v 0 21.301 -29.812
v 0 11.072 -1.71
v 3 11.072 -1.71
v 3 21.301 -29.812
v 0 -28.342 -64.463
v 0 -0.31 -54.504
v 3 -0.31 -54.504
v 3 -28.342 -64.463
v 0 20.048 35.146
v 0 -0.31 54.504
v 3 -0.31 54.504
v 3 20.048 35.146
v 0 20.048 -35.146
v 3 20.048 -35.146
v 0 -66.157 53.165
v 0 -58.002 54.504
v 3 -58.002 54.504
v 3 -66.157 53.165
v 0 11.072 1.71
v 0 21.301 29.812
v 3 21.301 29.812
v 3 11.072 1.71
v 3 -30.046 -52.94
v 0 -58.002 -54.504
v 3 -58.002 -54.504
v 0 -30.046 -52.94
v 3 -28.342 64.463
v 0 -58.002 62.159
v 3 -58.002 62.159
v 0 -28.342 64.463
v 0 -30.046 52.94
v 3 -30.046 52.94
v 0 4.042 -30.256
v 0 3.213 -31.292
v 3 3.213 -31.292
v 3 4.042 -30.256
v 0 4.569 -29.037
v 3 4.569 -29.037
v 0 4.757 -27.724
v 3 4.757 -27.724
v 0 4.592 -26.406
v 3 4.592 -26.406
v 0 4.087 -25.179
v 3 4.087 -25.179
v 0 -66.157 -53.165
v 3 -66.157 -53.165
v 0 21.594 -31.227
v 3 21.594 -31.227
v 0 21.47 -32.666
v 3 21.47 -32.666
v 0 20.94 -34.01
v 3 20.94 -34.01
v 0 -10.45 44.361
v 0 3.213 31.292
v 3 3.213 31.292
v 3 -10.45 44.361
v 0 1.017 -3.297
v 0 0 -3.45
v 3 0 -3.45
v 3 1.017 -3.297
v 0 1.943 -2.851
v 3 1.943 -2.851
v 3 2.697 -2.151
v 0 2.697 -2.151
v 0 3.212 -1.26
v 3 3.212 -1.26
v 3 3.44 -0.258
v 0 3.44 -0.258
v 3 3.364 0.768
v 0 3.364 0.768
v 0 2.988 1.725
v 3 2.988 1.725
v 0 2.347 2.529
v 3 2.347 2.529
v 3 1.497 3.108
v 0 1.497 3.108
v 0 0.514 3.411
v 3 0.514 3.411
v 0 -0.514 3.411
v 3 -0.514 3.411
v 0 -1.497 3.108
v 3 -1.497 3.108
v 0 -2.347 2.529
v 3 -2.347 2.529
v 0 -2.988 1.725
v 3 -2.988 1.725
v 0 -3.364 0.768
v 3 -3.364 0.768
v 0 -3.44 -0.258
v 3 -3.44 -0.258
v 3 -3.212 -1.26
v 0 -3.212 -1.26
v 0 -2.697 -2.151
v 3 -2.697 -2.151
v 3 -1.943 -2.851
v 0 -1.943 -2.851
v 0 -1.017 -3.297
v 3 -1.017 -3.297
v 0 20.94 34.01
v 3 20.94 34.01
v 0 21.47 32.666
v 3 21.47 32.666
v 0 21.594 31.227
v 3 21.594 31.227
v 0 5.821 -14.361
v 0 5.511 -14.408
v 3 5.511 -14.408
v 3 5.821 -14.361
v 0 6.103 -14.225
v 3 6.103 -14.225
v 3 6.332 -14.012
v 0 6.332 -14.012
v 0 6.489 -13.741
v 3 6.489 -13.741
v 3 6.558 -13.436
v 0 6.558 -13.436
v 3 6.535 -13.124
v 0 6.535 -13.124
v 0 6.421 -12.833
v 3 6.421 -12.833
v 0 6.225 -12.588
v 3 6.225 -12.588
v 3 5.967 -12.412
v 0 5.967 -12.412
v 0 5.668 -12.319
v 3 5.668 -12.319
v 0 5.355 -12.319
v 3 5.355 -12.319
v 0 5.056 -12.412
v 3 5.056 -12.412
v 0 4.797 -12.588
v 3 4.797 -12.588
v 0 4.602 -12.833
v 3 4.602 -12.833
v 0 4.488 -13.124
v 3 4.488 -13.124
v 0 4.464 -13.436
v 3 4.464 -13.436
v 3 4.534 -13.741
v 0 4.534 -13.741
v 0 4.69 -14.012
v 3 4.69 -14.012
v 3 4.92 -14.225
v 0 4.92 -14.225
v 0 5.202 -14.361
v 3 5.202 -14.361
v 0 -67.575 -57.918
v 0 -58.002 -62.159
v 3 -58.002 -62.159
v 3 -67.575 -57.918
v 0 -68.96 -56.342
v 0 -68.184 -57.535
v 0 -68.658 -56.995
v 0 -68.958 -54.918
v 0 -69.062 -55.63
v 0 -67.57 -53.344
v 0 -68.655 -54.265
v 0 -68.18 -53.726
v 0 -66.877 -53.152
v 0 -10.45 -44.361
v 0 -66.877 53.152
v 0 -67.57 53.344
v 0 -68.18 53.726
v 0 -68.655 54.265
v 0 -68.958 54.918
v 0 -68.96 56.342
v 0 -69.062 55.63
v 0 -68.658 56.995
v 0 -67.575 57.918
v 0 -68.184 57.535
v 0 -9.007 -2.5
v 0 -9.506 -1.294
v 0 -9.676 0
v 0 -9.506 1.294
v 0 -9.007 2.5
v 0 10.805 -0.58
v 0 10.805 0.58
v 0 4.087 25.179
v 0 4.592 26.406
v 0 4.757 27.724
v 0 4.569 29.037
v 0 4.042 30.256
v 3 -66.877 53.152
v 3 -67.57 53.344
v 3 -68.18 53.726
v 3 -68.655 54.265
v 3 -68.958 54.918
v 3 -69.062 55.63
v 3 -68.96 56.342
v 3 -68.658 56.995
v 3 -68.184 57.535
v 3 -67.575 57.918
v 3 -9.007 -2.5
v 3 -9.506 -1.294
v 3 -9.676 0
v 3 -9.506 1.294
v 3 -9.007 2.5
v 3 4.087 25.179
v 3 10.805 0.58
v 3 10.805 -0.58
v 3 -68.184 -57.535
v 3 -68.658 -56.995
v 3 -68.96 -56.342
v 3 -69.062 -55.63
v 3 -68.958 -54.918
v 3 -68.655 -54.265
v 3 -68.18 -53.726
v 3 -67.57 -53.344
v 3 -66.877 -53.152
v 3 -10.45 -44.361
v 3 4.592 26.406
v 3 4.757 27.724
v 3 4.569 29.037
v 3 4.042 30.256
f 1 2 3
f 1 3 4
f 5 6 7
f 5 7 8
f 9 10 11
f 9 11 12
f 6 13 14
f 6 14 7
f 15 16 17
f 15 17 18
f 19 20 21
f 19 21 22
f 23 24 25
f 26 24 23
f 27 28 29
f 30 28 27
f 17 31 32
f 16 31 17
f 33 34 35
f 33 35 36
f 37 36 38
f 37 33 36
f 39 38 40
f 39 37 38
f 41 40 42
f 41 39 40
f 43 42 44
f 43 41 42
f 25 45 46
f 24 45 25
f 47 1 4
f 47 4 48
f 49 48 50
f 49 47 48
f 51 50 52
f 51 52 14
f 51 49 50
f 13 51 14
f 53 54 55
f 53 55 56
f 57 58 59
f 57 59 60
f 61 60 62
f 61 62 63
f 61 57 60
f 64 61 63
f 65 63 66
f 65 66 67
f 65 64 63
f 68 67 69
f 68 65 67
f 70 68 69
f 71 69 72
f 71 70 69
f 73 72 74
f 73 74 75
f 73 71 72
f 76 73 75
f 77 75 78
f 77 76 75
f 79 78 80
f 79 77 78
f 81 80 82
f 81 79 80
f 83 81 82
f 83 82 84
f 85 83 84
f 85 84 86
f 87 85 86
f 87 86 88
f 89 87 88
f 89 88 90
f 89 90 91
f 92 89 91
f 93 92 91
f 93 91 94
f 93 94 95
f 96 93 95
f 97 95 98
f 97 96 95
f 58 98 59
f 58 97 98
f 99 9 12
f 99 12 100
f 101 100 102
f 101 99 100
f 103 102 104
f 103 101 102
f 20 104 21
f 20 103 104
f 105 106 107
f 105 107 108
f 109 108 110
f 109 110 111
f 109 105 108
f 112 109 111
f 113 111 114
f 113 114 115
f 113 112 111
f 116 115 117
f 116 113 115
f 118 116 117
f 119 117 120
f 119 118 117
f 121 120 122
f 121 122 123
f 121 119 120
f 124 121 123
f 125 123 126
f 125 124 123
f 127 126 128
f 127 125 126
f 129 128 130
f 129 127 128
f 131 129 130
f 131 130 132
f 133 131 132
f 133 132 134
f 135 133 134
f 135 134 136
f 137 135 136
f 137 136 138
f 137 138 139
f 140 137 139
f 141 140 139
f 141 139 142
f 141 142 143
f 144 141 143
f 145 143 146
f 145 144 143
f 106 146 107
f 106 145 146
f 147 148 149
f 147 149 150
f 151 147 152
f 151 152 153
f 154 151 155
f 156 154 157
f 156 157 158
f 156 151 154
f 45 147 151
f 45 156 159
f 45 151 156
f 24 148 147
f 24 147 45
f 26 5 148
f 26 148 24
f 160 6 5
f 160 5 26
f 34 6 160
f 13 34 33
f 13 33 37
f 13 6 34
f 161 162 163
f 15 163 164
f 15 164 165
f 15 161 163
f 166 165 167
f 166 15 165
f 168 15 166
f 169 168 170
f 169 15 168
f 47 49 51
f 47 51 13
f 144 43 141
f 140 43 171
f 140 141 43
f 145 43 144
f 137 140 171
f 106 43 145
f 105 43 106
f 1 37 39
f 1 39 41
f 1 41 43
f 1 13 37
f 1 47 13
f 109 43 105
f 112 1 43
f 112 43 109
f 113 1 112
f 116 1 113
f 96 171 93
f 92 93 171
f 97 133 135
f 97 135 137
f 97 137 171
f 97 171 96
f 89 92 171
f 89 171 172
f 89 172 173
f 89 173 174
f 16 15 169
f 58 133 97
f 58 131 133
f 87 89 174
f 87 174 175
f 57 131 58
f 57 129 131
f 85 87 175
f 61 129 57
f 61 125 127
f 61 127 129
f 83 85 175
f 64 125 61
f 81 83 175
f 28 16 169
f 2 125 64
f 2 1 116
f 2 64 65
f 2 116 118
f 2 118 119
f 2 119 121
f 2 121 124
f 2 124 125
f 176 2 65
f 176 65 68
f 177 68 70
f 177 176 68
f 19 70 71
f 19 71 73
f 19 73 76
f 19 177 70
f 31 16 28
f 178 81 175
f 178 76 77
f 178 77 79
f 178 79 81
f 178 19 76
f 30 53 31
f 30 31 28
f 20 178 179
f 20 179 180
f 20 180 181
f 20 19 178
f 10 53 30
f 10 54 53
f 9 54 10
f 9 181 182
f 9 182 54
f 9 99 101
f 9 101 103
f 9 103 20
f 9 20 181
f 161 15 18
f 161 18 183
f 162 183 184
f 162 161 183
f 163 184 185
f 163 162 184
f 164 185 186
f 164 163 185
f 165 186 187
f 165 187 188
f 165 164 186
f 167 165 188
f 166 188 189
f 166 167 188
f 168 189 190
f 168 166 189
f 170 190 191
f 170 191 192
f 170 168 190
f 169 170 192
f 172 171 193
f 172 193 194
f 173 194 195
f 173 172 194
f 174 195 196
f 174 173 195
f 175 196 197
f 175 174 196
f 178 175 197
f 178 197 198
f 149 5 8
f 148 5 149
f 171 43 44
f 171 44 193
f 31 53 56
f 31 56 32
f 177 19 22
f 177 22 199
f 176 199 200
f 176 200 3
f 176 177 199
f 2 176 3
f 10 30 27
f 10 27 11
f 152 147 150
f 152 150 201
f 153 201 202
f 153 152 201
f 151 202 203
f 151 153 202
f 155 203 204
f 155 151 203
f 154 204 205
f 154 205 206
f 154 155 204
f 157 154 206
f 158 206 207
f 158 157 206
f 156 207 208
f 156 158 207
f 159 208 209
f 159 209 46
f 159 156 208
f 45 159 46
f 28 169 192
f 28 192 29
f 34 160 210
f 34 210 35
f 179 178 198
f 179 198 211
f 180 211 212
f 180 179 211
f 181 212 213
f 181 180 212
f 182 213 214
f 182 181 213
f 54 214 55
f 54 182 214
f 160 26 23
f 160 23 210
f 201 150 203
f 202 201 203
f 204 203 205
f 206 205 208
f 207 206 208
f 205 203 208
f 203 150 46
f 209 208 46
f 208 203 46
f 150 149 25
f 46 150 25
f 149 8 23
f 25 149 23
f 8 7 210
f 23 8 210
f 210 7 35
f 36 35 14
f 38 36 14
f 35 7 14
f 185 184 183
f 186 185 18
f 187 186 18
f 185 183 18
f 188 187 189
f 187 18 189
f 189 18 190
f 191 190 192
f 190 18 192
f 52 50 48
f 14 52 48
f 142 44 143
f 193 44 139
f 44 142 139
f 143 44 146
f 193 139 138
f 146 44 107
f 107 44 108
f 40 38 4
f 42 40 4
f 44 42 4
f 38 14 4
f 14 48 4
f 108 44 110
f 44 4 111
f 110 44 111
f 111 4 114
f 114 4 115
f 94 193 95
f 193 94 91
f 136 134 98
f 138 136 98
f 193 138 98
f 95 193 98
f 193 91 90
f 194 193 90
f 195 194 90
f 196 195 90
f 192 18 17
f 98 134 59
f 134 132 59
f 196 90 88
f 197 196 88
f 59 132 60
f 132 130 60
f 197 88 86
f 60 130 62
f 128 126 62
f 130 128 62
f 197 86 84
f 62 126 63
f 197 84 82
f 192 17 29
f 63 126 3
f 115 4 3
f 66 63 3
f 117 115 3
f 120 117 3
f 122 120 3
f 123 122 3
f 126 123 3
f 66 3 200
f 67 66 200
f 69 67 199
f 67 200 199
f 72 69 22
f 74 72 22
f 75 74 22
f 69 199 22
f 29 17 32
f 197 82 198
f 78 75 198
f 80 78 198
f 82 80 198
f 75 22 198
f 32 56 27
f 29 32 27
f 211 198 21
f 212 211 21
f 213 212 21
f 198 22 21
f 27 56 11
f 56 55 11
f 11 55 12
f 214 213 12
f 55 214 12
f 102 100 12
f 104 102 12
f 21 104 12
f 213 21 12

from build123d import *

# Parameters (mm, degrees)
SKETCH1_R           = 3.45
SKETCH1_R_2         = 1.05
BOSS_EXTRUDE1_DEPTH = 3


with BuildPart() as part:
    # Sketch1 → Boss-Extrude1 (new body)
    with BuildSketch(Plane(origin=(0, 0, 0), x_dir=(0, 0, -1), z_dir=(1, 0, 0))):
        with BuildLine():
            Line((1.710100717, 11.072425758), (29.81221294, 21.300758128))
            ThreePointArc((29.81221294, 21.300758128), (32.665838041, 21.469774041), (35.145679665, 20.04775853))
            Line((35.145679665, 20.04775853), (54.503522355, -0.309603856))
            Line((54.503522355, -0.309603856), (64.462541824, -28.342275903))
            Line((64.462541824, -28.342275903), (62.158643896, -58.002094263))
            Line((62.158643896, -58.002094263), (57.918218143, -67.574774191))
            ThreePointArc((57.918218143, -67.574774191), (54.918016136, -68.957985447), (53.165427908, -66.157464075))
            Line((53.165427908, -66.157464075), (54.503522355, -58.002094263))
            Line((54.503522355, -58.002094263), (52.939962821, -30.04554677))
            Line((52.939962821, -30.04554677), (44.360806264, -10.45))
            Line((44.360806264, -10.45), (31.292334945, 3.213047447))
            ThreePointArc((31.292334945, 3.213047447), (28.386766522, 4.706668614), (25.179055571, 4.087134512))
            Line((25.179055571, 4.087134512), (2.5, -9.006624327))
            ThreePointArc((2.5, -9.006624327), (0, -9.676497308), (-2.5, -9.006624327))
            Line((-2.5, -9.006624327), (-25.179055571, 4.087134512))
            ThreePointArc((-25.179055571, 4.087134512), (-28.386766522, 4.706668614), (-31.292334945, 3.213047447))
            Line((-31.292334945, 3.213047447), (-44.360806264, -10.45))
            Line((-44.360806264, -10.45), (-52.939962821, -30.04554677))
            Line((-52.939962821, -30.04554677), (-54.503522355, -58.002094263))
            Line((-54.503522355, -58.002094263), (-53.165427908, -66.157464075))
            ThreePointArc((-53.165427908, -66.157464075), (-54.918016136, -68.957985447), (-57.918218143, -67.574774191))
            Line((-57.918218143, -67.574774191), (-62.158643896, -58.002094263))
            Line((-62.158643896, -58.002094263), (-64.462541824, -28.342275903))
            Line((-64.462541824, -28.342275903), (-54.503522355, -0.309603856))
            Line((-54.503522355, -0.309603856), (-35.145679665, 20.04775853))
            ThreePointArc((-35.145679665, 20.04775853), (-32.665838041, 21.469774041), (-29.81221294, 21.300758128))
            Line((-29.81221294, 21.300758128), (-1.710100717, 11.072425758))
            ThreePointArc((-1.710100717, 11.072425758), (0, 10.770888862), (1.710100717, 11.072425758))
        make_face()
        Circle(SKETCH1_R, mode=Mode.SUBTRACT)
        with Locations((13.357740048, 5.51119595)):
            Circle(SKETCH1_R_2, mode=Mode.SUBTRACT)
    extrude(amount=BOSS_EXTRUDE1_DEPTH)


solid = part.part
